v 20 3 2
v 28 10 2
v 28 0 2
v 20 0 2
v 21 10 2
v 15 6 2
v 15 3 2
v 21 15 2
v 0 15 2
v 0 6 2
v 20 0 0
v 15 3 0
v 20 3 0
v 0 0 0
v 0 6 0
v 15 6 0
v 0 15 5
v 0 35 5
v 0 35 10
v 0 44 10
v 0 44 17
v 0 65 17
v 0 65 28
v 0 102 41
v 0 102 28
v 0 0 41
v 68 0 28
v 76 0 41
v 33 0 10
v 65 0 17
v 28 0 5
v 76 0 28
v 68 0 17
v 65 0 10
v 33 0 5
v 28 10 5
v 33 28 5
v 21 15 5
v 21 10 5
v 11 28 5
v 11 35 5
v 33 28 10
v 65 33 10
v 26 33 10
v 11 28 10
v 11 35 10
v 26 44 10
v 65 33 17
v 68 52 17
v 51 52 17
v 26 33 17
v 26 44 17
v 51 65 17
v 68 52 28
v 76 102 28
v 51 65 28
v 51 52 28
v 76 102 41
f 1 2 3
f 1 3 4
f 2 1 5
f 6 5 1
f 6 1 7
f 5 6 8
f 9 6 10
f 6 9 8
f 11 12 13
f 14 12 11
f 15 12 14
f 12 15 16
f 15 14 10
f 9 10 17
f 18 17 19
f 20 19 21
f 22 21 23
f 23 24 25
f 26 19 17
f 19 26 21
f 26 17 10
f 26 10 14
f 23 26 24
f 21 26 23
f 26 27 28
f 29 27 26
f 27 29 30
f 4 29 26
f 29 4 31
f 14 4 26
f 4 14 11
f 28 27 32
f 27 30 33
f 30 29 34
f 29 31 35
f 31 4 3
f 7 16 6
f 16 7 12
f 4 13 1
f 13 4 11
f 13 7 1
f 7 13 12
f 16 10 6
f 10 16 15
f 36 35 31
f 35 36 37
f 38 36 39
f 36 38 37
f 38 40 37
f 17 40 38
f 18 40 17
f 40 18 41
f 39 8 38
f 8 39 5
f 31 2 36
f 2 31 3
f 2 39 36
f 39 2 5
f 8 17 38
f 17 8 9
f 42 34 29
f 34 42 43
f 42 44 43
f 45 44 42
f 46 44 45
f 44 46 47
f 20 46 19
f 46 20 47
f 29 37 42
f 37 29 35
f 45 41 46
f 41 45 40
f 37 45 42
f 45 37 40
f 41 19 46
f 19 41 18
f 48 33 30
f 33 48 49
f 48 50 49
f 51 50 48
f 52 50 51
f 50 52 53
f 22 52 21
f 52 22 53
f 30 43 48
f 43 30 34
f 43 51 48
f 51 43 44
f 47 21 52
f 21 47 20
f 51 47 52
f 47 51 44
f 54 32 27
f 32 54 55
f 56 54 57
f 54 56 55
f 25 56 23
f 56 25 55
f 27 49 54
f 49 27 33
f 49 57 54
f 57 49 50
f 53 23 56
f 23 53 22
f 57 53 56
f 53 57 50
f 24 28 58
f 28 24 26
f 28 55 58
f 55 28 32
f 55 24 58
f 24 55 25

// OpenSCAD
translate([2.5, 1.5, 1.0]) color([0.7398695784196249, 0.9015687423954613, 0.06478718309218656]) cube([5, 3, 2], center=true);
translate([7.5, 1.5, 1.0]) color([0.3075184499818515, 0.32730937178137276, 0.373196919474838]) cube([5, 3, 2], center=true);
translate([12.5, 1.5, 1.0]) color([0.48026967262350795, 0.5820603979481933, 0.1372879505883815]) cube([5, 3, 2], center=true);
translate([17.5, 1.5, 1.0]) color([0.015498761483451418, 0.5048497045627587, 0.36698725510709684]) cube([5, 3, 2], center=true);
translate([2.5, 4.5, 1.0]) color([0.6348155217266559, 0.811995686067811, 0.8768405645756486]) cube([5, 3, 2], center=true);
translate([7.5, 4.5, 1.0]) color([0.1552431358080847, 0.1767648869043179, 0.991228648099722]) cube([5, 3, 2], center=true);
translate([12.5, 4.5, 1.0]) color([0.13558077637136434, 0.20650423900368708, 0.9151210693627757]) cube([5, 3, 2], center=true);
translate([3.5, 2.5, 3.5]) color([0.49673738754911745, 0.7672539256192649, 0.969306850533619]) cube([7, 5, 3], center=true);
translate([10.5, 2.5, 3.5]) color([0.23531586477578126, 0.13212860983739783, 0.23368957459901674]) cube([7, 5, 3], center=true);
translate([17.5, 2.5, 3.5]) color([0.38460662479298113, 0.6084990843462054, 0.1325407149567407]) cube([7, 5, 3], center=true);
translate([24.5, 2.5, 3.5]) color([0.4984659545183915, 0.9178662904203972, 0.6160167741323543]) cube([7, 5, 3], center=true);
translate([3.5, 7.5, 3.5]) color([0.02601445858505036, 0.596125612844632, 0.48919913512172475]) cube([7, 5, 3], center=true);
translate([10.5, 7.5, 3.5]) color([0.30869925031539414, 0.9586301909392594, 0.5555224541780607]) cube([7, 5, 3], center=true);
translate([17.5, 7.5, 3.5]) color([0.16303723797834868, 0.8790785483620981, 0.8092366229990562]) cube([7, 5, 3], center=true);
translate([24.5, 7.5, 3.5]) color([0.7373715302416316, 0.5460288399006699, 0.7042240787132147]) cube([7, 5, 3], center=true);
translate([3.5, 12.5, 3.5]) color([0.07877233817546292, 0.13744427713979768, 0.40185422229333856]) cube([7, 5, 3], center=true);
translate([10.5, 12.5, 3.5]) color([0.1910666288561843, 0.31642065037316636, 0.2917281417853558]) cube([7, 5, 3], center=true);
translate([17.5, 12.5, 3.5]) color([0.9437754009602987, 0.20866341172373193, 0.3151573145870893]) cube([7, 5, 3], center=true);
translate([5.5, 3.5, 7.5]) color([0.7470721078045024, 0.24960896628473228, 0.8629627260654799]) cube([11, 7, 5], center=true);
translate([16.5, 3.5, 7.5]) color([0.6684326881602258, 0.6597695027130189, 0.22591717735012307]) cube([11, 7, 5], center=true);
translate([27.5, 3.5, 7.5]) color([0.3441717078654829, 0.16233220178561225, 0.01697652307419406]) cube([11, 7, 5], center=true);
translate([5.5, 10.5, 7.5]) color([0.5735931064152219, 0.05818297514553228, 0.6304378073753134]) cube([11, 7, 5], center=true);
translate([16.5, 10.5, 7.5]) color([0.35341956482818127, 0.49110709598533775, 0.06132304686728618]) cube([11, 7, 5], center=true);
translate([27.5, 10.5, 7.5]) color([0.24146702174069912, 0.012441234482642782, 0.9455344576677447]) cube([11, 7, 5], center=true);
translate([5.5, 17.5, 7.5]) color([0.3266678829978785, 0.820956849026723, 0.34492851027915805]) cube([11, 7, 5], center=true);
translate([16.5, 17.5, 7.5]) color([0.6639756368298299, 0.13585073420724958, 0.9219835342207869]) cube([11, 7, 5], center=true);
translate([27.5, 17.5, 7.5]) color([0.44896684911260887, 0.1420549627992148, 0.3119518323014343]) cube([11, 7, 5], center=true);
translate([5.5, 24.5, 7.5]) color([0.6490756968320398, 0.7280642389267371, 0.7852833252199665]) cube([11, 7, 5], center=true);
translate([16.5, 24.5, 7.5]) color([0.40863068686923587, 0.009633238682779877, 0.8909238596539266]) cube([11, 7, 5], center=true);
translate([27.5, 24.5, 7.5]) color([0.533705581213062, 0.8046005274030336, 0.9806276909012095]) cube([11, 7, 5], center=true);
translate([5.5, 31.5, 7.5]) color([0.7049346898693578, 0.7590860206033218, 0.5647284680717275]) cube([11, 7, 5], center=true);
translate([6.5, 5.5, 13.5]) color([0.12259546226958773, 0.9539533584587191, 0.1713156178825357]) cube([13, 11, 7], center=true);
translate([19.5, 5.5, 13.5]) color([0.5005542720722199, 0.621843985236089, 0.6619765424276485]) cube([13, 11, 7], center=true);
translate([32.5, 5.5, 13.5]) color([0.8400519693824264, 0.699601591737329, 0.07964741684534404]) cube([13, 11, 7], center=true);
translate([45.5, 5.5, 13.5]) color([0.23738047361475634, 0.8282556520451495, 0.1762738246231843]) cube([13, 11, 7], center=true);
translate([58.5, 5.5, 13.5]) color([0.9459581227747745, 0.9565644324307663, 0.8963269305888116]) cube([13, 11, 7], center=true);
translate([6.5, 16.5, 13.5]) color([0.7428117304122551, 0.8383436924491765, 0.5614087817692366]) cube([13, 11, 7], center=true);
translate([19.5, 16.5, 13.5]) color([0.7177928021437573, 0.4271772721979724, 0.8646648421725511]) cube([13, 11, 7], center=true);
translate([32.5, 16.5, 13.5]) color([0.10365846470378459, 0.6285317276232824, 0.7101075213407797]) cube([13, 11, 7], center=true);
translate([45.5, 16.5, 13.5]) color([0.6149371087697887, 0.0400488022899097, 0.34025031183581533]) cube([13, 11, 7], center=true);
translate([58.5, 16.5, 13.5]) color([0.7380159626358669, 0.3765176313166855, 0.6257641682954356]) cube([13, 11, 7], center=true);
translate([6.5, 27.5, 13.5]) color([0.8894786539399329, 0.4963449395419606, 0.3583651728386771]) cube([13, 11, 7], center=true);
translate([19.5, 27.5, 13.5]) color([0.6716454412848432, 0.45811681625355094, 0.5074379917667022]) cube([13, 11, 7], center=true);
translate([32.5, 27.5, 13.5]) color([0.16228475224599026, 0.7529781863444399, 0.3376457636791449]) cube([13, 11, 7], center=true);
translate([45.5, 27.5, 13.5]) color([0.8033239356600728, 0.9444207727357242, 0.014783921172948133]) cube([13, 11, 7], center=true);
translate([58.5, 27.5, 13.5]) color([0.5303420268039528, 0.2882277186993394, 0.4689175335863792]) cube([13, 11, 7], center=true);
translate([6.5, 38.5, 13.5]) color([0.03492832759702502, 0.5317931441254861, 0.552095437515129]) cube([13, 11, 7], center=true);
translate([19.5, 38.5, 13.5]) color([0.9340898594770107, 0.03830085289416996, 0.3950652682884612]) cube([13, 11, 7], center=true);
translate([8.5, 6.5, 22.5]) color([0.1200155720396251, 0.34658884626630715, 0.051152415727703016]) cube([17, 13, 11], center=true);
translate([25.5, 6.5, 22.5]) color([0.2730496953424699, 0.9956802504828091, 0.25391998649183944]) cube([17, 13, 11], center=true);
translate([42.5, 6.5, 22.5]) color([0.6803935586065328, 0.7027090324157298, 0.9291230685247301]) cube([17, 13, 11], center=true);
translate([59.5, 6.5, 22.5]) color([0.9949404722907454, 0.7620813713006523, 0.7625973189567923]) cube([17, 13, 11], center=true);
translate([8.5, 19.5, 22.5]) color([0.5162610213479427, 0.3860717563215982, 0.8343975914408754]) cube([17, 13, 11], center=true);
translate([25.5, 19.5, 22.5]) color([0.2506337702942619, 0.11599539642064438, 0.9817240858781537]) cube([17, 13, 11], center=true);
translate([42.5, 19.5, 22.5]) color([0.8047994372884794, 0.9431012043694105, 0.24264659424234813]) cube([17, 13, 11], center=true);
translate([59.5, 19.5, 22.5]) color([0.6738638931519124, 0.5327800265053269, 0.8756440829735669]) cube([17, 13, 11], center=true);
translate([8.5, 32.5, 22.5]) color([0.16255101499230828, 0.8680483691353614, 0.15305579700066485]) cube([17, 13, 11], center=true);
translate([25.5, 32.5, 22.5]) color([0.8462165202751376, 0.8200801239095041, 0.5849326984313064]) cube([17, 13, 11], center=true);
translate([42.5, 32.5, 22.5]) color([0.05125489506773162, 0.156166769208809, 0.34458118202681143]) cube([17, 13, 11], center=true);
translate([59.5, 32.5, 22.5]) color([0.291190613997825, 0.29342424365134856, 0.49485912757206985]) cube([17, 13, 11], center=true);
translate([8.5, 45.5, 22.5]) color([0.40365829021262367, 0.43100562682353716, 0.17003546655932655]) cube([17, 13, 11], center=true);
translate([25.5, 45.5, 22.5]) color([0.788340085303476, 0.5686027559906347, 0.44188886974638586]) cube([17, 13, 11], center=true);
translate([42.5, 45.5, 22.5]) color([0.3413461590512491, 0.009317740415098474, 0.72162474304745]) cube([17, 13, 11], center=true);
translate([59.5, 45.5, 22.5]) color([0.9099060293040379, 0.6642090292154819, 0.6628365798191557]) cube([17, 13, 11], center=true);
translate([8.5, 58.5, 22.5]) color([0.2575988974219705, 0.6122127561841502, 0.07024606726227145]) cube([17, 13, 11], center=true);
translate([25.5, 58.5, 22.5]) color([0.936077955543095, 0.27870721332570936, 0.8301443917589898]) cube([17, 13, 11], center=true);
translate([42.5, 58.5, 22.5]) color([0.5295296249528143, 0.06328696503387199, 0.639390097241117]) cube([17, 13, 11], center=true);
translate([9.5, 8.5, 34.5]) color([0.579686955437464, 0.9416538141960143, 0.6321291610349786]) cube([19, 17, 13], center=true);
translate([28.5, 8.5, 34.5]) color([0.5434228748459046, 0.38469874676133664, 0.434637548519362]) cube([19, 17, 13], center=true);
translate([47.5, 8.5, 34.5]) color([0.31139777068021024, 0.01363511702942577, 0.7785312160167684]) cube([19, 17, 13], center=true);
translate([66.5, 8.5, 34.5]) color([0.8197509625398982, 0.28044077713976767, 0.2581907625337724]) cube([19, 17, 13], center=true);
translate([9.5, 25.5, 34.5]) color([0.5272652548146236, 0.3179301097250754, 0.3422638341038545]) cube([19, 17, 13], center=true);
translate([28.5, 25.5, 34.5]) color([0.7055726929201963, 0.43169639849300545, 0.14170724037842175]) cube([19, 17, 13], center=true);
translate([47.5, 25.5, 34.5]) color([0.0059275683019511805, 0.5113413643489257, 0.7846494738841625]) cube([19, 17, 13], center=true);
translate([66.5, 25.5, 34.5]) color([0.7013909140505133, 0.7815279332048084, 0.38414456219182536]) cube([19, 17, 13], center=true);
translate([9.5, 42.5, 34.5]) color([0.4641305725985776, 0.036369164001931575, 0.9124290899309246]) cube([19, 17, 13], center=true);
translate([28.5, 42.5, 34.5]) color([0.6366653413633517, 0.798477007479407, 0.7602358551941967]) cube([19, 17, 13], center=true);
translate([47.5, 42.5, 34.5]) color([0.899814300356001, 0.3622224295816935, 0.9815510059994267]) cube([19, 17, 13], center=true);
translate([66.5, 42.5, 34.5]) color([0.15851660579635174, 0.19450942151924966, 0.35447317829590397]) cube([19, 17, 13], center=true);
translate([9.5, 59.5, 34.5]) color([0.700089123077614, 0.019141470871264166, 0.7352582011311831]) cube([19, 17, 13], center=true);
translate([28.5, 59.5, 34.5]) color([0.5715587801616956, 0.24207966979200135, 0.18514161515939986]) cube([19, 17, 13], center=true);
translate([47.5, 59.5, 34.5]) color([0.7580746928341441, 0.4199819570625165, 0.5731405723704375]) cube([19, 17, 13], center=true);
translate([66.5, 59.5, 34.5]) color([0.23673356878784502, 0.7138158488992904, 0.8637627475626694]) cube([19, 17, 13], center=true);
translate([9.5, 76.5, 34.5]) color([0.8949592620642776, 0.8103115760161889, 0.1004216369837837]) cube([19, 17, 13], center=true);
translate([28.5, 76.5, 34.5]) color([0.18827941391234093, 0.44049583318501173, 0.06522983258952386]) cube([19, 17, 13], center=true);
translate([47.5, 76.5, 34.5]) color([0.42674703623912436, 0.3947422574489625, 0.27185274848852736]) cube([19, 17, 13], center=true);
translate([66.5, 76.5, 34.5]) color([0.43721657158275895, 0.7577296702077931, 0.3561631337530091]) cube([19, 17, 13], center=true);
translate([9.5, 93.5, 34.5]) color([0.3277620307403001, 0.30701912216942273, 0.492518074892234]) cube([19, 17, 13], center=true);
translate([28.5, 93.5, 34.5]) color([0.7625268269371841, 0.2027877178963453, 0.39789846082497404]) cube([19, 17, 13], center=true);
translate([47.5, 93.5, 34.5]) color([0.4356119392473006, 0.6353731723550147, 0.673076446274384]) cube([19, 17, 13], center=true);
translate([66.5, 93.5, 34.5]) color([0.6970991483341651, 0.8225488218547198, 0.5826892216899469]) cube([19, 17, 13], center=true);
